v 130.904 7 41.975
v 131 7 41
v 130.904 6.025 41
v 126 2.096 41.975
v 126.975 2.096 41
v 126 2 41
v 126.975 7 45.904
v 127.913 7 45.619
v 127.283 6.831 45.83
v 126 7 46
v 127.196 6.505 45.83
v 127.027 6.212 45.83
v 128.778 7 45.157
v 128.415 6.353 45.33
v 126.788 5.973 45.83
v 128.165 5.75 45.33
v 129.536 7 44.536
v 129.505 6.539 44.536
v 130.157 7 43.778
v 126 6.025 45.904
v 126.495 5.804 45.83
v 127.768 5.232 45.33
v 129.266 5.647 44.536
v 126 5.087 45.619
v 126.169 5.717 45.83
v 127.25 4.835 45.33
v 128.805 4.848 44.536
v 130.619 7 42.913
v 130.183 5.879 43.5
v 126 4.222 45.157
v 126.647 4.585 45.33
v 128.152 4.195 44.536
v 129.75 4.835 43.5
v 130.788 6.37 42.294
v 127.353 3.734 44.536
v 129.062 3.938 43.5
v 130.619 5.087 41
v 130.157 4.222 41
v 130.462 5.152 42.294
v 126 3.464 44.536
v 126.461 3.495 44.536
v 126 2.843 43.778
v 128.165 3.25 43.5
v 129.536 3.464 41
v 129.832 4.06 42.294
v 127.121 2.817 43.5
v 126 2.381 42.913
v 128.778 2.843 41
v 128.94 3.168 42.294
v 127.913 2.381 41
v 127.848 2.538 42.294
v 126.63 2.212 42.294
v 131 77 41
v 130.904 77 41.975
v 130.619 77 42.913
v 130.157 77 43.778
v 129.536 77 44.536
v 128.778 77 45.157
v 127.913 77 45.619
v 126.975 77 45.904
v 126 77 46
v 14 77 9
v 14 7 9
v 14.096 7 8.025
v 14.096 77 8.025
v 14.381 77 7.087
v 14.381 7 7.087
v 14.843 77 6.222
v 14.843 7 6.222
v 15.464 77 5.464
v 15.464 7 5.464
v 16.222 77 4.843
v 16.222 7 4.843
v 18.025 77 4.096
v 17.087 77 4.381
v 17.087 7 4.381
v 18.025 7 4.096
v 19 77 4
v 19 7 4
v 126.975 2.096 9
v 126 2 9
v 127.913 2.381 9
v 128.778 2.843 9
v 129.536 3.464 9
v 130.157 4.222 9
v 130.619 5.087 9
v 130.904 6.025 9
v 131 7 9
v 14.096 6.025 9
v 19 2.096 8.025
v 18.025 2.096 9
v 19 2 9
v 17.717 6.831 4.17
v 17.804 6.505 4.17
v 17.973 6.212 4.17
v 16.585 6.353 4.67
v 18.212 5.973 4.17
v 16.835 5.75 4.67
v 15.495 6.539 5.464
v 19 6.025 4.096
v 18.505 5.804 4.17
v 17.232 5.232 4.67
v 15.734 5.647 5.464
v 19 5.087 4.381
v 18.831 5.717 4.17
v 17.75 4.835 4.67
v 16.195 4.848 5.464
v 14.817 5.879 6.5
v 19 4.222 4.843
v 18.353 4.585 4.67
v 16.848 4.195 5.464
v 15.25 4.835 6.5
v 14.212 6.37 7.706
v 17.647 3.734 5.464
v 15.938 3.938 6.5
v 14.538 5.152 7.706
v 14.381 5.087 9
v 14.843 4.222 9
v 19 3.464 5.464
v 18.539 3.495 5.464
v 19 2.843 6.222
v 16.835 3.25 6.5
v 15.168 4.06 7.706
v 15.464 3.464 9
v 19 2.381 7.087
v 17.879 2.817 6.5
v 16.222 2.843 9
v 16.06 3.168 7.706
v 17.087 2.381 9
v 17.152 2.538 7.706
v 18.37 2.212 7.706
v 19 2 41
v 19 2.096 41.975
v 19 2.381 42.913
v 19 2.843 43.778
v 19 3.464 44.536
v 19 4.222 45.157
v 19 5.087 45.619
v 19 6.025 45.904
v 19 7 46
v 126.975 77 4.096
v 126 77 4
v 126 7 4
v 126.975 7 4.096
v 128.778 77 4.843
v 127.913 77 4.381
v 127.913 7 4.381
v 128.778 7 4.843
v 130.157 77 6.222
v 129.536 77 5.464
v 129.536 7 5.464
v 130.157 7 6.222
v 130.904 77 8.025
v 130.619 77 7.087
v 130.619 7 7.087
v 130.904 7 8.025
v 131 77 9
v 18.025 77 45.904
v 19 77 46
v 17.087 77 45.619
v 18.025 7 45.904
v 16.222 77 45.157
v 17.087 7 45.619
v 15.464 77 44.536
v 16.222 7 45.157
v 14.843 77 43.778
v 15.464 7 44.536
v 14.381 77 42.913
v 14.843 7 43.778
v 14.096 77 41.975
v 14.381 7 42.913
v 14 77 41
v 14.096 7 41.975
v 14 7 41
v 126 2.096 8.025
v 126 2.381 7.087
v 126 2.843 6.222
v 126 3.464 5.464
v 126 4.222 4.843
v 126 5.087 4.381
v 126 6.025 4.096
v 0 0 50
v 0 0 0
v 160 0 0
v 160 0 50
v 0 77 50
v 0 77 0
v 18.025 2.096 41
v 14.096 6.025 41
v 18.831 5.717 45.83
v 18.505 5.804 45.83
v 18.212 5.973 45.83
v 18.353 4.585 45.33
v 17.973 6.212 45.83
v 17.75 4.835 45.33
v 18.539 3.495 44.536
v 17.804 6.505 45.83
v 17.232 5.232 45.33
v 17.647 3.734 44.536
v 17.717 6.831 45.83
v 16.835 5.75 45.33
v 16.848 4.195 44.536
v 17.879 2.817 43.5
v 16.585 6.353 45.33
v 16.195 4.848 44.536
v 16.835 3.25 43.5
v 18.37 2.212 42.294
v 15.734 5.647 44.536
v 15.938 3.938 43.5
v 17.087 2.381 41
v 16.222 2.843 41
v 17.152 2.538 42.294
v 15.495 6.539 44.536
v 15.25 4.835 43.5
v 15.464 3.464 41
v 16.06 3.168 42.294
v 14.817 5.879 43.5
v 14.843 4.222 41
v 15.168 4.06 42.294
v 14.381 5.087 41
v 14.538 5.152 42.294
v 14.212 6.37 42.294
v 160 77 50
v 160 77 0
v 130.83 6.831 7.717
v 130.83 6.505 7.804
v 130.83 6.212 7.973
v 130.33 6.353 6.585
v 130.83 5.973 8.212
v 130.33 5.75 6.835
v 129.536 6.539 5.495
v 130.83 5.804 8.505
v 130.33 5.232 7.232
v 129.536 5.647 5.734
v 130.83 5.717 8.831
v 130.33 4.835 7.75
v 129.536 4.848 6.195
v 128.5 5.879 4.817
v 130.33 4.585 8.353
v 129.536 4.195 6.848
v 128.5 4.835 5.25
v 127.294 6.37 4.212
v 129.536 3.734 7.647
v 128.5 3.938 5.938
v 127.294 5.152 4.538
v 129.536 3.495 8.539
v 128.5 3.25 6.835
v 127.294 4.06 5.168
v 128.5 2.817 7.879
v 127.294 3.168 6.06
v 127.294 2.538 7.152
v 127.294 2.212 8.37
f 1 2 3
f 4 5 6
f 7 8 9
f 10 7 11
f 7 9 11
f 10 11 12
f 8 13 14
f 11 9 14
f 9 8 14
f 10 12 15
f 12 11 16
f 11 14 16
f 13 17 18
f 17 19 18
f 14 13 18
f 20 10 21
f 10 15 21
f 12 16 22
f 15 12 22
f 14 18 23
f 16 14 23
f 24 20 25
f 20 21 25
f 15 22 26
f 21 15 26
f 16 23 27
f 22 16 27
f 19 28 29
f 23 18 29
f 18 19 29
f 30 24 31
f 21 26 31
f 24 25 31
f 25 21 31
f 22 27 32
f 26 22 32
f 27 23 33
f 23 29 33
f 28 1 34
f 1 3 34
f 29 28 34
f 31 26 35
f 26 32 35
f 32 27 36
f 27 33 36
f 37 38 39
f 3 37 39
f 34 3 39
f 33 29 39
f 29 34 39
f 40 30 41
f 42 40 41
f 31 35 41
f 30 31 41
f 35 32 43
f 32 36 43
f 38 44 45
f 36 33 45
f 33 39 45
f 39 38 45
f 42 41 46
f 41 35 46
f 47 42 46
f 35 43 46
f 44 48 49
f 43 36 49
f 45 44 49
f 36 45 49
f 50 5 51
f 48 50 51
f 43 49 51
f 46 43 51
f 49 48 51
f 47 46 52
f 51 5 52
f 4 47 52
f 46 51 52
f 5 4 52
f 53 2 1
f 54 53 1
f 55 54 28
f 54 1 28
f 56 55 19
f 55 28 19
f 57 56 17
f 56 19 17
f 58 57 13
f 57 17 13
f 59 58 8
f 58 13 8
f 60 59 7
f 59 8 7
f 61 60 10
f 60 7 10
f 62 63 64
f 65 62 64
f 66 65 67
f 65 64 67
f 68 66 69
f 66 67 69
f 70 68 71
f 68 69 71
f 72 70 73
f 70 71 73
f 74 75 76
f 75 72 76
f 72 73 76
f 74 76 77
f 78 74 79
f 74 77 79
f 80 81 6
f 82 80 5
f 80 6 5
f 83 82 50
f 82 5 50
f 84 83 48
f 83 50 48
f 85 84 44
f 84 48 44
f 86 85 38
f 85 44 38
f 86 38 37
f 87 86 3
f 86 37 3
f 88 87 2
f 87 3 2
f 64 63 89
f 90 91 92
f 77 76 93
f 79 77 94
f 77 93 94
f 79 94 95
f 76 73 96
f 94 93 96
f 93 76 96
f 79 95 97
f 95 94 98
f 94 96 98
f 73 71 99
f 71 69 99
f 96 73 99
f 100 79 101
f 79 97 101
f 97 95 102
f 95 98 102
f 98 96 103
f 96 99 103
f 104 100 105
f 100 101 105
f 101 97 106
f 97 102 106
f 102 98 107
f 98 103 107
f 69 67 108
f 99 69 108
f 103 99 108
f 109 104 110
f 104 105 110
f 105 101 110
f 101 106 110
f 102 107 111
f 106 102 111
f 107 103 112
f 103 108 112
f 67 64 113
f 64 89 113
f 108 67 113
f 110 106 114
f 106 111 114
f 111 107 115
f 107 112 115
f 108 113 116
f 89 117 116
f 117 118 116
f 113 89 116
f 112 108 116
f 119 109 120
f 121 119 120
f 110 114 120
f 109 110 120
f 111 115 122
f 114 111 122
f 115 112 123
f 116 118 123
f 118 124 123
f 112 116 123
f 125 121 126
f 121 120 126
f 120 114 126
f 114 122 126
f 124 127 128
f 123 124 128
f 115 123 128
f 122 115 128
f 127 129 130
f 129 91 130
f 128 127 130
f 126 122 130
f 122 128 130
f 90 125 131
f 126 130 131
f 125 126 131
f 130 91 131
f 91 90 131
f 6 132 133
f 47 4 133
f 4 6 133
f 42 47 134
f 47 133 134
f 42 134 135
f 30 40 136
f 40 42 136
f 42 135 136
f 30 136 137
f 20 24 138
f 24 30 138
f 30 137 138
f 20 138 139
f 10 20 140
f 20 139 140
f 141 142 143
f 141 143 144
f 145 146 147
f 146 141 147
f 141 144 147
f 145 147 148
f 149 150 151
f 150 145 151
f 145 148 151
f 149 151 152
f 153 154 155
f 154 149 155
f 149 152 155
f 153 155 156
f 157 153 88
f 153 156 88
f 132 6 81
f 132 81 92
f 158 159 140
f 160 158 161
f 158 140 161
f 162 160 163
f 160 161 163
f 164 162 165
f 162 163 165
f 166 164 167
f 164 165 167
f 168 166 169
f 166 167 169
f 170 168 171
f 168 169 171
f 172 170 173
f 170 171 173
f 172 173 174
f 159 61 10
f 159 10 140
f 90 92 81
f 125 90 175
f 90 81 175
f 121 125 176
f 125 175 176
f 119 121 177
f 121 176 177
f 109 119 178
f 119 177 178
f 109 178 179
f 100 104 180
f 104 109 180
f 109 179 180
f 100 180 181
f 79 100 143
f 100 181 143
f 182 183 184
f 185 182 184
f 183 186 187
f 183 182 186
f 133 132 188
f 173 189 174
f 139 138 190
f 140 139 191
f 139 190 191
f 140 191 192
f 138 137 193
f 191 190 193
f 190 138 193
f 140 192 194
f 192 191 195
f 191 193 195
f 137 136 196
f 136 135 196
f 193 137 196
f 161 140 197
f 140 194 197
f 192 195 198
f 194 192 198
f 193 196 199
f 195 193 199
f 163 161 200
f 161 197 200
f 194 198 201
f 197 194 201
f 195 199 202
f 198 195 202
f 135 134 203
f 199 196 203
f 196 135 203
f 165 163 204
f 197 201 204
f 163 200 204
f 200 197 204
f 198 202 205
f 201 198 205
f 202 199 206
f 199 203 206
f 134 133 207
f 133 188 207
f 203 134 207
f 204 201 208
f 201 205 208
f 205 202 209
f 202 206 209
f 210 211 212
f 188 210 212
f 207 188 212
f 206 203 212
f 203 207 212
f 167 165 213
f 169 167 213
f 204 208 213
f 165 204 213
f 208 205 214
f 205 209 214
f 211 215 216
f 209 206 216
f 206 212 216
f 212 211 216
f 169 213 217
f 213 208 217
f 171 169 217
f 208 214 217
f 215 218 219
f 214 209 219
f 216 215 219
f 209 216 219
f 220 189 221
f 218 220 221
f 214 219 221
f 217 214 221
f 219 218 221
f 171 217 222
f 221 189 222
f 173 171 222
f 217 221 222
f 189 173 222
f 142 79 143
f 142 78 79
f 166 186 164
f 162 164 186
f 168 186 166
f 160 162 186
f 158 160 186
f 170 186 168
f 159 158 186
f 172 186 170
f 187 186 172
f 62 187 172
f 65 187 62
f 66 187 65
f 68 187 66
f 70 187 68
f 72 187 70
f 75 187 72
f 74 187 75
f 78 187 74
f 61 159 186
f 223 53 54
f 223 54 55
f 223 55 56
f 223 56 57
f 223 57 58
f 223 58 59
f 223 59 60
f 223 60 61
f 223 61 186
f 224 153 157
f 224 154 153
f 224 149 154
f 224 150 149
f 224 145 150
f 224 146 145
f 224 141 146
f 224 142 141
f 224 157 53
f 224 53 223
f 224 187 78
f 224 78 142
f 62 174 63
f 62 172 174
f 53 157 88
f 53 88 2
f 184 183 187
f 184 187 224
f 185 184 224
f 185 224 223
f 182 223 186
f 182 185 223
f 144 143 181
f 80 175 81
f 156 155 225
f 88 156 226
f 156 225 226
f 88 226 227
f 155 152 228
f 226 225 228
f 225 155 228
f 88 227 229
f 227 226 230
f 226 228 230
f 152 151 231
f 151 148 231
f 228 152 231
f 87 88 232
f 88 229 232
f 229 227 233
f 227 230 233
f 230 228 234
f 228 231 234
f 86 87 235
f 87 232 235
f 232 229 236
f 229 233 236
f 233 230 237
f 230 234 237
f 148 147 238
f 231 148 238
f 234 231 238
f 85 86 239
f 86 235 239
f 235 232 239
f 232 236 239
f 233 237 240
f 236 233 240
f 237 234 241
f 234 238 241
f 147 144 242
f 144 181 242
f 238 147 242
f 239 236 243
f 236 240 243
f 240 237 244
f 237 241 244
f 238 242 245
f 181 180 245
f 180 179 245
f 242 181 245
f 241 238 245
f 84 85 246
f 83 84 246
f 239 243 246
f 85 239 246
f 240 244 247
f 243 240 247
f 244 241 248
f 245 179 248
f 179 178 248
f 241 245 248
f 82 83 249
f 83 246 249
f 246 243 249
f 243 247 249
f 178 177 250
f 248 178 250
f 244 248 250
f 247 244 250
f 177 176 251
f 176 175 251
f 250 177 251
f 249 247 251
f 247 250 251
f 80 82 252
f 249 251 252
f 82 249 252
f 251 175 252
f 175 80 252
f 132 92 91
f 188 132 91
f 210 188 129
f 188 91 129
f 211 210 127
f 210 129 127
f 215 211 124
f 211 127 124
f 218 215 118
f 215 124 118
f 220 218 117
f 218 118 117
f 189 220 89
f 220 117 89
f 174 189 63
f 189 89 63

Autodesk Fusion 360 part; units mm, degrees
sketch "Esboço1" plane through (0, 0, 0) normal (0, 1, 0) x (1, 0, 0)
  line L0 (0, 0) -> (160, 0)
  line L1 (160, 0) -> (160, -50)
  line L2 (160, -50) -> (0, -50)
  line L3 (0, -50) -> (0, 0)
  dimension "d1" = 160
  dimension "d2" = 50
extrude "Extrusão1" add sketch "Esboço1" along normal blind 77
sketch "Esboço2" plane through (0, 77, 0) normal (0, 1, 0) x (-1, 0, 0)
  line L0 (0, 50) -> (-160, 50)
  line L1 (-160, 50) -> (-160, 0)
  line L2 (-160, 0) -> (0, 0)
  line L3 (0, 0) -> (0, 50)
  line L4 (-131, 46) -> (-14, 46)
  line L5 (-14, 46) -> (-14, 4)
  line L6 (-14, 4) -> (-131, 4)
  line L7 (-131, 4) -> (-131, 46)
  dimension "d5" = 117
  dimension "d6" = 42
  dimension "d7" = 4
  dimension "d8" = 4
  dimension "d9" = 14
extrude "Extrusão2" cut sketch "Esboço2" against normal blind 75 contours L4 L5 L6 L7
fillet "Arredondamento1" radius 5 8 edges at (14, 2, 25) (14, 39.5, 4) (14, 39.5, 46) (72.5, 2, 4) (131, 39.5, 4) (131, 2, 25) (72.5, 2, 46) (131, 39.5, 46)
